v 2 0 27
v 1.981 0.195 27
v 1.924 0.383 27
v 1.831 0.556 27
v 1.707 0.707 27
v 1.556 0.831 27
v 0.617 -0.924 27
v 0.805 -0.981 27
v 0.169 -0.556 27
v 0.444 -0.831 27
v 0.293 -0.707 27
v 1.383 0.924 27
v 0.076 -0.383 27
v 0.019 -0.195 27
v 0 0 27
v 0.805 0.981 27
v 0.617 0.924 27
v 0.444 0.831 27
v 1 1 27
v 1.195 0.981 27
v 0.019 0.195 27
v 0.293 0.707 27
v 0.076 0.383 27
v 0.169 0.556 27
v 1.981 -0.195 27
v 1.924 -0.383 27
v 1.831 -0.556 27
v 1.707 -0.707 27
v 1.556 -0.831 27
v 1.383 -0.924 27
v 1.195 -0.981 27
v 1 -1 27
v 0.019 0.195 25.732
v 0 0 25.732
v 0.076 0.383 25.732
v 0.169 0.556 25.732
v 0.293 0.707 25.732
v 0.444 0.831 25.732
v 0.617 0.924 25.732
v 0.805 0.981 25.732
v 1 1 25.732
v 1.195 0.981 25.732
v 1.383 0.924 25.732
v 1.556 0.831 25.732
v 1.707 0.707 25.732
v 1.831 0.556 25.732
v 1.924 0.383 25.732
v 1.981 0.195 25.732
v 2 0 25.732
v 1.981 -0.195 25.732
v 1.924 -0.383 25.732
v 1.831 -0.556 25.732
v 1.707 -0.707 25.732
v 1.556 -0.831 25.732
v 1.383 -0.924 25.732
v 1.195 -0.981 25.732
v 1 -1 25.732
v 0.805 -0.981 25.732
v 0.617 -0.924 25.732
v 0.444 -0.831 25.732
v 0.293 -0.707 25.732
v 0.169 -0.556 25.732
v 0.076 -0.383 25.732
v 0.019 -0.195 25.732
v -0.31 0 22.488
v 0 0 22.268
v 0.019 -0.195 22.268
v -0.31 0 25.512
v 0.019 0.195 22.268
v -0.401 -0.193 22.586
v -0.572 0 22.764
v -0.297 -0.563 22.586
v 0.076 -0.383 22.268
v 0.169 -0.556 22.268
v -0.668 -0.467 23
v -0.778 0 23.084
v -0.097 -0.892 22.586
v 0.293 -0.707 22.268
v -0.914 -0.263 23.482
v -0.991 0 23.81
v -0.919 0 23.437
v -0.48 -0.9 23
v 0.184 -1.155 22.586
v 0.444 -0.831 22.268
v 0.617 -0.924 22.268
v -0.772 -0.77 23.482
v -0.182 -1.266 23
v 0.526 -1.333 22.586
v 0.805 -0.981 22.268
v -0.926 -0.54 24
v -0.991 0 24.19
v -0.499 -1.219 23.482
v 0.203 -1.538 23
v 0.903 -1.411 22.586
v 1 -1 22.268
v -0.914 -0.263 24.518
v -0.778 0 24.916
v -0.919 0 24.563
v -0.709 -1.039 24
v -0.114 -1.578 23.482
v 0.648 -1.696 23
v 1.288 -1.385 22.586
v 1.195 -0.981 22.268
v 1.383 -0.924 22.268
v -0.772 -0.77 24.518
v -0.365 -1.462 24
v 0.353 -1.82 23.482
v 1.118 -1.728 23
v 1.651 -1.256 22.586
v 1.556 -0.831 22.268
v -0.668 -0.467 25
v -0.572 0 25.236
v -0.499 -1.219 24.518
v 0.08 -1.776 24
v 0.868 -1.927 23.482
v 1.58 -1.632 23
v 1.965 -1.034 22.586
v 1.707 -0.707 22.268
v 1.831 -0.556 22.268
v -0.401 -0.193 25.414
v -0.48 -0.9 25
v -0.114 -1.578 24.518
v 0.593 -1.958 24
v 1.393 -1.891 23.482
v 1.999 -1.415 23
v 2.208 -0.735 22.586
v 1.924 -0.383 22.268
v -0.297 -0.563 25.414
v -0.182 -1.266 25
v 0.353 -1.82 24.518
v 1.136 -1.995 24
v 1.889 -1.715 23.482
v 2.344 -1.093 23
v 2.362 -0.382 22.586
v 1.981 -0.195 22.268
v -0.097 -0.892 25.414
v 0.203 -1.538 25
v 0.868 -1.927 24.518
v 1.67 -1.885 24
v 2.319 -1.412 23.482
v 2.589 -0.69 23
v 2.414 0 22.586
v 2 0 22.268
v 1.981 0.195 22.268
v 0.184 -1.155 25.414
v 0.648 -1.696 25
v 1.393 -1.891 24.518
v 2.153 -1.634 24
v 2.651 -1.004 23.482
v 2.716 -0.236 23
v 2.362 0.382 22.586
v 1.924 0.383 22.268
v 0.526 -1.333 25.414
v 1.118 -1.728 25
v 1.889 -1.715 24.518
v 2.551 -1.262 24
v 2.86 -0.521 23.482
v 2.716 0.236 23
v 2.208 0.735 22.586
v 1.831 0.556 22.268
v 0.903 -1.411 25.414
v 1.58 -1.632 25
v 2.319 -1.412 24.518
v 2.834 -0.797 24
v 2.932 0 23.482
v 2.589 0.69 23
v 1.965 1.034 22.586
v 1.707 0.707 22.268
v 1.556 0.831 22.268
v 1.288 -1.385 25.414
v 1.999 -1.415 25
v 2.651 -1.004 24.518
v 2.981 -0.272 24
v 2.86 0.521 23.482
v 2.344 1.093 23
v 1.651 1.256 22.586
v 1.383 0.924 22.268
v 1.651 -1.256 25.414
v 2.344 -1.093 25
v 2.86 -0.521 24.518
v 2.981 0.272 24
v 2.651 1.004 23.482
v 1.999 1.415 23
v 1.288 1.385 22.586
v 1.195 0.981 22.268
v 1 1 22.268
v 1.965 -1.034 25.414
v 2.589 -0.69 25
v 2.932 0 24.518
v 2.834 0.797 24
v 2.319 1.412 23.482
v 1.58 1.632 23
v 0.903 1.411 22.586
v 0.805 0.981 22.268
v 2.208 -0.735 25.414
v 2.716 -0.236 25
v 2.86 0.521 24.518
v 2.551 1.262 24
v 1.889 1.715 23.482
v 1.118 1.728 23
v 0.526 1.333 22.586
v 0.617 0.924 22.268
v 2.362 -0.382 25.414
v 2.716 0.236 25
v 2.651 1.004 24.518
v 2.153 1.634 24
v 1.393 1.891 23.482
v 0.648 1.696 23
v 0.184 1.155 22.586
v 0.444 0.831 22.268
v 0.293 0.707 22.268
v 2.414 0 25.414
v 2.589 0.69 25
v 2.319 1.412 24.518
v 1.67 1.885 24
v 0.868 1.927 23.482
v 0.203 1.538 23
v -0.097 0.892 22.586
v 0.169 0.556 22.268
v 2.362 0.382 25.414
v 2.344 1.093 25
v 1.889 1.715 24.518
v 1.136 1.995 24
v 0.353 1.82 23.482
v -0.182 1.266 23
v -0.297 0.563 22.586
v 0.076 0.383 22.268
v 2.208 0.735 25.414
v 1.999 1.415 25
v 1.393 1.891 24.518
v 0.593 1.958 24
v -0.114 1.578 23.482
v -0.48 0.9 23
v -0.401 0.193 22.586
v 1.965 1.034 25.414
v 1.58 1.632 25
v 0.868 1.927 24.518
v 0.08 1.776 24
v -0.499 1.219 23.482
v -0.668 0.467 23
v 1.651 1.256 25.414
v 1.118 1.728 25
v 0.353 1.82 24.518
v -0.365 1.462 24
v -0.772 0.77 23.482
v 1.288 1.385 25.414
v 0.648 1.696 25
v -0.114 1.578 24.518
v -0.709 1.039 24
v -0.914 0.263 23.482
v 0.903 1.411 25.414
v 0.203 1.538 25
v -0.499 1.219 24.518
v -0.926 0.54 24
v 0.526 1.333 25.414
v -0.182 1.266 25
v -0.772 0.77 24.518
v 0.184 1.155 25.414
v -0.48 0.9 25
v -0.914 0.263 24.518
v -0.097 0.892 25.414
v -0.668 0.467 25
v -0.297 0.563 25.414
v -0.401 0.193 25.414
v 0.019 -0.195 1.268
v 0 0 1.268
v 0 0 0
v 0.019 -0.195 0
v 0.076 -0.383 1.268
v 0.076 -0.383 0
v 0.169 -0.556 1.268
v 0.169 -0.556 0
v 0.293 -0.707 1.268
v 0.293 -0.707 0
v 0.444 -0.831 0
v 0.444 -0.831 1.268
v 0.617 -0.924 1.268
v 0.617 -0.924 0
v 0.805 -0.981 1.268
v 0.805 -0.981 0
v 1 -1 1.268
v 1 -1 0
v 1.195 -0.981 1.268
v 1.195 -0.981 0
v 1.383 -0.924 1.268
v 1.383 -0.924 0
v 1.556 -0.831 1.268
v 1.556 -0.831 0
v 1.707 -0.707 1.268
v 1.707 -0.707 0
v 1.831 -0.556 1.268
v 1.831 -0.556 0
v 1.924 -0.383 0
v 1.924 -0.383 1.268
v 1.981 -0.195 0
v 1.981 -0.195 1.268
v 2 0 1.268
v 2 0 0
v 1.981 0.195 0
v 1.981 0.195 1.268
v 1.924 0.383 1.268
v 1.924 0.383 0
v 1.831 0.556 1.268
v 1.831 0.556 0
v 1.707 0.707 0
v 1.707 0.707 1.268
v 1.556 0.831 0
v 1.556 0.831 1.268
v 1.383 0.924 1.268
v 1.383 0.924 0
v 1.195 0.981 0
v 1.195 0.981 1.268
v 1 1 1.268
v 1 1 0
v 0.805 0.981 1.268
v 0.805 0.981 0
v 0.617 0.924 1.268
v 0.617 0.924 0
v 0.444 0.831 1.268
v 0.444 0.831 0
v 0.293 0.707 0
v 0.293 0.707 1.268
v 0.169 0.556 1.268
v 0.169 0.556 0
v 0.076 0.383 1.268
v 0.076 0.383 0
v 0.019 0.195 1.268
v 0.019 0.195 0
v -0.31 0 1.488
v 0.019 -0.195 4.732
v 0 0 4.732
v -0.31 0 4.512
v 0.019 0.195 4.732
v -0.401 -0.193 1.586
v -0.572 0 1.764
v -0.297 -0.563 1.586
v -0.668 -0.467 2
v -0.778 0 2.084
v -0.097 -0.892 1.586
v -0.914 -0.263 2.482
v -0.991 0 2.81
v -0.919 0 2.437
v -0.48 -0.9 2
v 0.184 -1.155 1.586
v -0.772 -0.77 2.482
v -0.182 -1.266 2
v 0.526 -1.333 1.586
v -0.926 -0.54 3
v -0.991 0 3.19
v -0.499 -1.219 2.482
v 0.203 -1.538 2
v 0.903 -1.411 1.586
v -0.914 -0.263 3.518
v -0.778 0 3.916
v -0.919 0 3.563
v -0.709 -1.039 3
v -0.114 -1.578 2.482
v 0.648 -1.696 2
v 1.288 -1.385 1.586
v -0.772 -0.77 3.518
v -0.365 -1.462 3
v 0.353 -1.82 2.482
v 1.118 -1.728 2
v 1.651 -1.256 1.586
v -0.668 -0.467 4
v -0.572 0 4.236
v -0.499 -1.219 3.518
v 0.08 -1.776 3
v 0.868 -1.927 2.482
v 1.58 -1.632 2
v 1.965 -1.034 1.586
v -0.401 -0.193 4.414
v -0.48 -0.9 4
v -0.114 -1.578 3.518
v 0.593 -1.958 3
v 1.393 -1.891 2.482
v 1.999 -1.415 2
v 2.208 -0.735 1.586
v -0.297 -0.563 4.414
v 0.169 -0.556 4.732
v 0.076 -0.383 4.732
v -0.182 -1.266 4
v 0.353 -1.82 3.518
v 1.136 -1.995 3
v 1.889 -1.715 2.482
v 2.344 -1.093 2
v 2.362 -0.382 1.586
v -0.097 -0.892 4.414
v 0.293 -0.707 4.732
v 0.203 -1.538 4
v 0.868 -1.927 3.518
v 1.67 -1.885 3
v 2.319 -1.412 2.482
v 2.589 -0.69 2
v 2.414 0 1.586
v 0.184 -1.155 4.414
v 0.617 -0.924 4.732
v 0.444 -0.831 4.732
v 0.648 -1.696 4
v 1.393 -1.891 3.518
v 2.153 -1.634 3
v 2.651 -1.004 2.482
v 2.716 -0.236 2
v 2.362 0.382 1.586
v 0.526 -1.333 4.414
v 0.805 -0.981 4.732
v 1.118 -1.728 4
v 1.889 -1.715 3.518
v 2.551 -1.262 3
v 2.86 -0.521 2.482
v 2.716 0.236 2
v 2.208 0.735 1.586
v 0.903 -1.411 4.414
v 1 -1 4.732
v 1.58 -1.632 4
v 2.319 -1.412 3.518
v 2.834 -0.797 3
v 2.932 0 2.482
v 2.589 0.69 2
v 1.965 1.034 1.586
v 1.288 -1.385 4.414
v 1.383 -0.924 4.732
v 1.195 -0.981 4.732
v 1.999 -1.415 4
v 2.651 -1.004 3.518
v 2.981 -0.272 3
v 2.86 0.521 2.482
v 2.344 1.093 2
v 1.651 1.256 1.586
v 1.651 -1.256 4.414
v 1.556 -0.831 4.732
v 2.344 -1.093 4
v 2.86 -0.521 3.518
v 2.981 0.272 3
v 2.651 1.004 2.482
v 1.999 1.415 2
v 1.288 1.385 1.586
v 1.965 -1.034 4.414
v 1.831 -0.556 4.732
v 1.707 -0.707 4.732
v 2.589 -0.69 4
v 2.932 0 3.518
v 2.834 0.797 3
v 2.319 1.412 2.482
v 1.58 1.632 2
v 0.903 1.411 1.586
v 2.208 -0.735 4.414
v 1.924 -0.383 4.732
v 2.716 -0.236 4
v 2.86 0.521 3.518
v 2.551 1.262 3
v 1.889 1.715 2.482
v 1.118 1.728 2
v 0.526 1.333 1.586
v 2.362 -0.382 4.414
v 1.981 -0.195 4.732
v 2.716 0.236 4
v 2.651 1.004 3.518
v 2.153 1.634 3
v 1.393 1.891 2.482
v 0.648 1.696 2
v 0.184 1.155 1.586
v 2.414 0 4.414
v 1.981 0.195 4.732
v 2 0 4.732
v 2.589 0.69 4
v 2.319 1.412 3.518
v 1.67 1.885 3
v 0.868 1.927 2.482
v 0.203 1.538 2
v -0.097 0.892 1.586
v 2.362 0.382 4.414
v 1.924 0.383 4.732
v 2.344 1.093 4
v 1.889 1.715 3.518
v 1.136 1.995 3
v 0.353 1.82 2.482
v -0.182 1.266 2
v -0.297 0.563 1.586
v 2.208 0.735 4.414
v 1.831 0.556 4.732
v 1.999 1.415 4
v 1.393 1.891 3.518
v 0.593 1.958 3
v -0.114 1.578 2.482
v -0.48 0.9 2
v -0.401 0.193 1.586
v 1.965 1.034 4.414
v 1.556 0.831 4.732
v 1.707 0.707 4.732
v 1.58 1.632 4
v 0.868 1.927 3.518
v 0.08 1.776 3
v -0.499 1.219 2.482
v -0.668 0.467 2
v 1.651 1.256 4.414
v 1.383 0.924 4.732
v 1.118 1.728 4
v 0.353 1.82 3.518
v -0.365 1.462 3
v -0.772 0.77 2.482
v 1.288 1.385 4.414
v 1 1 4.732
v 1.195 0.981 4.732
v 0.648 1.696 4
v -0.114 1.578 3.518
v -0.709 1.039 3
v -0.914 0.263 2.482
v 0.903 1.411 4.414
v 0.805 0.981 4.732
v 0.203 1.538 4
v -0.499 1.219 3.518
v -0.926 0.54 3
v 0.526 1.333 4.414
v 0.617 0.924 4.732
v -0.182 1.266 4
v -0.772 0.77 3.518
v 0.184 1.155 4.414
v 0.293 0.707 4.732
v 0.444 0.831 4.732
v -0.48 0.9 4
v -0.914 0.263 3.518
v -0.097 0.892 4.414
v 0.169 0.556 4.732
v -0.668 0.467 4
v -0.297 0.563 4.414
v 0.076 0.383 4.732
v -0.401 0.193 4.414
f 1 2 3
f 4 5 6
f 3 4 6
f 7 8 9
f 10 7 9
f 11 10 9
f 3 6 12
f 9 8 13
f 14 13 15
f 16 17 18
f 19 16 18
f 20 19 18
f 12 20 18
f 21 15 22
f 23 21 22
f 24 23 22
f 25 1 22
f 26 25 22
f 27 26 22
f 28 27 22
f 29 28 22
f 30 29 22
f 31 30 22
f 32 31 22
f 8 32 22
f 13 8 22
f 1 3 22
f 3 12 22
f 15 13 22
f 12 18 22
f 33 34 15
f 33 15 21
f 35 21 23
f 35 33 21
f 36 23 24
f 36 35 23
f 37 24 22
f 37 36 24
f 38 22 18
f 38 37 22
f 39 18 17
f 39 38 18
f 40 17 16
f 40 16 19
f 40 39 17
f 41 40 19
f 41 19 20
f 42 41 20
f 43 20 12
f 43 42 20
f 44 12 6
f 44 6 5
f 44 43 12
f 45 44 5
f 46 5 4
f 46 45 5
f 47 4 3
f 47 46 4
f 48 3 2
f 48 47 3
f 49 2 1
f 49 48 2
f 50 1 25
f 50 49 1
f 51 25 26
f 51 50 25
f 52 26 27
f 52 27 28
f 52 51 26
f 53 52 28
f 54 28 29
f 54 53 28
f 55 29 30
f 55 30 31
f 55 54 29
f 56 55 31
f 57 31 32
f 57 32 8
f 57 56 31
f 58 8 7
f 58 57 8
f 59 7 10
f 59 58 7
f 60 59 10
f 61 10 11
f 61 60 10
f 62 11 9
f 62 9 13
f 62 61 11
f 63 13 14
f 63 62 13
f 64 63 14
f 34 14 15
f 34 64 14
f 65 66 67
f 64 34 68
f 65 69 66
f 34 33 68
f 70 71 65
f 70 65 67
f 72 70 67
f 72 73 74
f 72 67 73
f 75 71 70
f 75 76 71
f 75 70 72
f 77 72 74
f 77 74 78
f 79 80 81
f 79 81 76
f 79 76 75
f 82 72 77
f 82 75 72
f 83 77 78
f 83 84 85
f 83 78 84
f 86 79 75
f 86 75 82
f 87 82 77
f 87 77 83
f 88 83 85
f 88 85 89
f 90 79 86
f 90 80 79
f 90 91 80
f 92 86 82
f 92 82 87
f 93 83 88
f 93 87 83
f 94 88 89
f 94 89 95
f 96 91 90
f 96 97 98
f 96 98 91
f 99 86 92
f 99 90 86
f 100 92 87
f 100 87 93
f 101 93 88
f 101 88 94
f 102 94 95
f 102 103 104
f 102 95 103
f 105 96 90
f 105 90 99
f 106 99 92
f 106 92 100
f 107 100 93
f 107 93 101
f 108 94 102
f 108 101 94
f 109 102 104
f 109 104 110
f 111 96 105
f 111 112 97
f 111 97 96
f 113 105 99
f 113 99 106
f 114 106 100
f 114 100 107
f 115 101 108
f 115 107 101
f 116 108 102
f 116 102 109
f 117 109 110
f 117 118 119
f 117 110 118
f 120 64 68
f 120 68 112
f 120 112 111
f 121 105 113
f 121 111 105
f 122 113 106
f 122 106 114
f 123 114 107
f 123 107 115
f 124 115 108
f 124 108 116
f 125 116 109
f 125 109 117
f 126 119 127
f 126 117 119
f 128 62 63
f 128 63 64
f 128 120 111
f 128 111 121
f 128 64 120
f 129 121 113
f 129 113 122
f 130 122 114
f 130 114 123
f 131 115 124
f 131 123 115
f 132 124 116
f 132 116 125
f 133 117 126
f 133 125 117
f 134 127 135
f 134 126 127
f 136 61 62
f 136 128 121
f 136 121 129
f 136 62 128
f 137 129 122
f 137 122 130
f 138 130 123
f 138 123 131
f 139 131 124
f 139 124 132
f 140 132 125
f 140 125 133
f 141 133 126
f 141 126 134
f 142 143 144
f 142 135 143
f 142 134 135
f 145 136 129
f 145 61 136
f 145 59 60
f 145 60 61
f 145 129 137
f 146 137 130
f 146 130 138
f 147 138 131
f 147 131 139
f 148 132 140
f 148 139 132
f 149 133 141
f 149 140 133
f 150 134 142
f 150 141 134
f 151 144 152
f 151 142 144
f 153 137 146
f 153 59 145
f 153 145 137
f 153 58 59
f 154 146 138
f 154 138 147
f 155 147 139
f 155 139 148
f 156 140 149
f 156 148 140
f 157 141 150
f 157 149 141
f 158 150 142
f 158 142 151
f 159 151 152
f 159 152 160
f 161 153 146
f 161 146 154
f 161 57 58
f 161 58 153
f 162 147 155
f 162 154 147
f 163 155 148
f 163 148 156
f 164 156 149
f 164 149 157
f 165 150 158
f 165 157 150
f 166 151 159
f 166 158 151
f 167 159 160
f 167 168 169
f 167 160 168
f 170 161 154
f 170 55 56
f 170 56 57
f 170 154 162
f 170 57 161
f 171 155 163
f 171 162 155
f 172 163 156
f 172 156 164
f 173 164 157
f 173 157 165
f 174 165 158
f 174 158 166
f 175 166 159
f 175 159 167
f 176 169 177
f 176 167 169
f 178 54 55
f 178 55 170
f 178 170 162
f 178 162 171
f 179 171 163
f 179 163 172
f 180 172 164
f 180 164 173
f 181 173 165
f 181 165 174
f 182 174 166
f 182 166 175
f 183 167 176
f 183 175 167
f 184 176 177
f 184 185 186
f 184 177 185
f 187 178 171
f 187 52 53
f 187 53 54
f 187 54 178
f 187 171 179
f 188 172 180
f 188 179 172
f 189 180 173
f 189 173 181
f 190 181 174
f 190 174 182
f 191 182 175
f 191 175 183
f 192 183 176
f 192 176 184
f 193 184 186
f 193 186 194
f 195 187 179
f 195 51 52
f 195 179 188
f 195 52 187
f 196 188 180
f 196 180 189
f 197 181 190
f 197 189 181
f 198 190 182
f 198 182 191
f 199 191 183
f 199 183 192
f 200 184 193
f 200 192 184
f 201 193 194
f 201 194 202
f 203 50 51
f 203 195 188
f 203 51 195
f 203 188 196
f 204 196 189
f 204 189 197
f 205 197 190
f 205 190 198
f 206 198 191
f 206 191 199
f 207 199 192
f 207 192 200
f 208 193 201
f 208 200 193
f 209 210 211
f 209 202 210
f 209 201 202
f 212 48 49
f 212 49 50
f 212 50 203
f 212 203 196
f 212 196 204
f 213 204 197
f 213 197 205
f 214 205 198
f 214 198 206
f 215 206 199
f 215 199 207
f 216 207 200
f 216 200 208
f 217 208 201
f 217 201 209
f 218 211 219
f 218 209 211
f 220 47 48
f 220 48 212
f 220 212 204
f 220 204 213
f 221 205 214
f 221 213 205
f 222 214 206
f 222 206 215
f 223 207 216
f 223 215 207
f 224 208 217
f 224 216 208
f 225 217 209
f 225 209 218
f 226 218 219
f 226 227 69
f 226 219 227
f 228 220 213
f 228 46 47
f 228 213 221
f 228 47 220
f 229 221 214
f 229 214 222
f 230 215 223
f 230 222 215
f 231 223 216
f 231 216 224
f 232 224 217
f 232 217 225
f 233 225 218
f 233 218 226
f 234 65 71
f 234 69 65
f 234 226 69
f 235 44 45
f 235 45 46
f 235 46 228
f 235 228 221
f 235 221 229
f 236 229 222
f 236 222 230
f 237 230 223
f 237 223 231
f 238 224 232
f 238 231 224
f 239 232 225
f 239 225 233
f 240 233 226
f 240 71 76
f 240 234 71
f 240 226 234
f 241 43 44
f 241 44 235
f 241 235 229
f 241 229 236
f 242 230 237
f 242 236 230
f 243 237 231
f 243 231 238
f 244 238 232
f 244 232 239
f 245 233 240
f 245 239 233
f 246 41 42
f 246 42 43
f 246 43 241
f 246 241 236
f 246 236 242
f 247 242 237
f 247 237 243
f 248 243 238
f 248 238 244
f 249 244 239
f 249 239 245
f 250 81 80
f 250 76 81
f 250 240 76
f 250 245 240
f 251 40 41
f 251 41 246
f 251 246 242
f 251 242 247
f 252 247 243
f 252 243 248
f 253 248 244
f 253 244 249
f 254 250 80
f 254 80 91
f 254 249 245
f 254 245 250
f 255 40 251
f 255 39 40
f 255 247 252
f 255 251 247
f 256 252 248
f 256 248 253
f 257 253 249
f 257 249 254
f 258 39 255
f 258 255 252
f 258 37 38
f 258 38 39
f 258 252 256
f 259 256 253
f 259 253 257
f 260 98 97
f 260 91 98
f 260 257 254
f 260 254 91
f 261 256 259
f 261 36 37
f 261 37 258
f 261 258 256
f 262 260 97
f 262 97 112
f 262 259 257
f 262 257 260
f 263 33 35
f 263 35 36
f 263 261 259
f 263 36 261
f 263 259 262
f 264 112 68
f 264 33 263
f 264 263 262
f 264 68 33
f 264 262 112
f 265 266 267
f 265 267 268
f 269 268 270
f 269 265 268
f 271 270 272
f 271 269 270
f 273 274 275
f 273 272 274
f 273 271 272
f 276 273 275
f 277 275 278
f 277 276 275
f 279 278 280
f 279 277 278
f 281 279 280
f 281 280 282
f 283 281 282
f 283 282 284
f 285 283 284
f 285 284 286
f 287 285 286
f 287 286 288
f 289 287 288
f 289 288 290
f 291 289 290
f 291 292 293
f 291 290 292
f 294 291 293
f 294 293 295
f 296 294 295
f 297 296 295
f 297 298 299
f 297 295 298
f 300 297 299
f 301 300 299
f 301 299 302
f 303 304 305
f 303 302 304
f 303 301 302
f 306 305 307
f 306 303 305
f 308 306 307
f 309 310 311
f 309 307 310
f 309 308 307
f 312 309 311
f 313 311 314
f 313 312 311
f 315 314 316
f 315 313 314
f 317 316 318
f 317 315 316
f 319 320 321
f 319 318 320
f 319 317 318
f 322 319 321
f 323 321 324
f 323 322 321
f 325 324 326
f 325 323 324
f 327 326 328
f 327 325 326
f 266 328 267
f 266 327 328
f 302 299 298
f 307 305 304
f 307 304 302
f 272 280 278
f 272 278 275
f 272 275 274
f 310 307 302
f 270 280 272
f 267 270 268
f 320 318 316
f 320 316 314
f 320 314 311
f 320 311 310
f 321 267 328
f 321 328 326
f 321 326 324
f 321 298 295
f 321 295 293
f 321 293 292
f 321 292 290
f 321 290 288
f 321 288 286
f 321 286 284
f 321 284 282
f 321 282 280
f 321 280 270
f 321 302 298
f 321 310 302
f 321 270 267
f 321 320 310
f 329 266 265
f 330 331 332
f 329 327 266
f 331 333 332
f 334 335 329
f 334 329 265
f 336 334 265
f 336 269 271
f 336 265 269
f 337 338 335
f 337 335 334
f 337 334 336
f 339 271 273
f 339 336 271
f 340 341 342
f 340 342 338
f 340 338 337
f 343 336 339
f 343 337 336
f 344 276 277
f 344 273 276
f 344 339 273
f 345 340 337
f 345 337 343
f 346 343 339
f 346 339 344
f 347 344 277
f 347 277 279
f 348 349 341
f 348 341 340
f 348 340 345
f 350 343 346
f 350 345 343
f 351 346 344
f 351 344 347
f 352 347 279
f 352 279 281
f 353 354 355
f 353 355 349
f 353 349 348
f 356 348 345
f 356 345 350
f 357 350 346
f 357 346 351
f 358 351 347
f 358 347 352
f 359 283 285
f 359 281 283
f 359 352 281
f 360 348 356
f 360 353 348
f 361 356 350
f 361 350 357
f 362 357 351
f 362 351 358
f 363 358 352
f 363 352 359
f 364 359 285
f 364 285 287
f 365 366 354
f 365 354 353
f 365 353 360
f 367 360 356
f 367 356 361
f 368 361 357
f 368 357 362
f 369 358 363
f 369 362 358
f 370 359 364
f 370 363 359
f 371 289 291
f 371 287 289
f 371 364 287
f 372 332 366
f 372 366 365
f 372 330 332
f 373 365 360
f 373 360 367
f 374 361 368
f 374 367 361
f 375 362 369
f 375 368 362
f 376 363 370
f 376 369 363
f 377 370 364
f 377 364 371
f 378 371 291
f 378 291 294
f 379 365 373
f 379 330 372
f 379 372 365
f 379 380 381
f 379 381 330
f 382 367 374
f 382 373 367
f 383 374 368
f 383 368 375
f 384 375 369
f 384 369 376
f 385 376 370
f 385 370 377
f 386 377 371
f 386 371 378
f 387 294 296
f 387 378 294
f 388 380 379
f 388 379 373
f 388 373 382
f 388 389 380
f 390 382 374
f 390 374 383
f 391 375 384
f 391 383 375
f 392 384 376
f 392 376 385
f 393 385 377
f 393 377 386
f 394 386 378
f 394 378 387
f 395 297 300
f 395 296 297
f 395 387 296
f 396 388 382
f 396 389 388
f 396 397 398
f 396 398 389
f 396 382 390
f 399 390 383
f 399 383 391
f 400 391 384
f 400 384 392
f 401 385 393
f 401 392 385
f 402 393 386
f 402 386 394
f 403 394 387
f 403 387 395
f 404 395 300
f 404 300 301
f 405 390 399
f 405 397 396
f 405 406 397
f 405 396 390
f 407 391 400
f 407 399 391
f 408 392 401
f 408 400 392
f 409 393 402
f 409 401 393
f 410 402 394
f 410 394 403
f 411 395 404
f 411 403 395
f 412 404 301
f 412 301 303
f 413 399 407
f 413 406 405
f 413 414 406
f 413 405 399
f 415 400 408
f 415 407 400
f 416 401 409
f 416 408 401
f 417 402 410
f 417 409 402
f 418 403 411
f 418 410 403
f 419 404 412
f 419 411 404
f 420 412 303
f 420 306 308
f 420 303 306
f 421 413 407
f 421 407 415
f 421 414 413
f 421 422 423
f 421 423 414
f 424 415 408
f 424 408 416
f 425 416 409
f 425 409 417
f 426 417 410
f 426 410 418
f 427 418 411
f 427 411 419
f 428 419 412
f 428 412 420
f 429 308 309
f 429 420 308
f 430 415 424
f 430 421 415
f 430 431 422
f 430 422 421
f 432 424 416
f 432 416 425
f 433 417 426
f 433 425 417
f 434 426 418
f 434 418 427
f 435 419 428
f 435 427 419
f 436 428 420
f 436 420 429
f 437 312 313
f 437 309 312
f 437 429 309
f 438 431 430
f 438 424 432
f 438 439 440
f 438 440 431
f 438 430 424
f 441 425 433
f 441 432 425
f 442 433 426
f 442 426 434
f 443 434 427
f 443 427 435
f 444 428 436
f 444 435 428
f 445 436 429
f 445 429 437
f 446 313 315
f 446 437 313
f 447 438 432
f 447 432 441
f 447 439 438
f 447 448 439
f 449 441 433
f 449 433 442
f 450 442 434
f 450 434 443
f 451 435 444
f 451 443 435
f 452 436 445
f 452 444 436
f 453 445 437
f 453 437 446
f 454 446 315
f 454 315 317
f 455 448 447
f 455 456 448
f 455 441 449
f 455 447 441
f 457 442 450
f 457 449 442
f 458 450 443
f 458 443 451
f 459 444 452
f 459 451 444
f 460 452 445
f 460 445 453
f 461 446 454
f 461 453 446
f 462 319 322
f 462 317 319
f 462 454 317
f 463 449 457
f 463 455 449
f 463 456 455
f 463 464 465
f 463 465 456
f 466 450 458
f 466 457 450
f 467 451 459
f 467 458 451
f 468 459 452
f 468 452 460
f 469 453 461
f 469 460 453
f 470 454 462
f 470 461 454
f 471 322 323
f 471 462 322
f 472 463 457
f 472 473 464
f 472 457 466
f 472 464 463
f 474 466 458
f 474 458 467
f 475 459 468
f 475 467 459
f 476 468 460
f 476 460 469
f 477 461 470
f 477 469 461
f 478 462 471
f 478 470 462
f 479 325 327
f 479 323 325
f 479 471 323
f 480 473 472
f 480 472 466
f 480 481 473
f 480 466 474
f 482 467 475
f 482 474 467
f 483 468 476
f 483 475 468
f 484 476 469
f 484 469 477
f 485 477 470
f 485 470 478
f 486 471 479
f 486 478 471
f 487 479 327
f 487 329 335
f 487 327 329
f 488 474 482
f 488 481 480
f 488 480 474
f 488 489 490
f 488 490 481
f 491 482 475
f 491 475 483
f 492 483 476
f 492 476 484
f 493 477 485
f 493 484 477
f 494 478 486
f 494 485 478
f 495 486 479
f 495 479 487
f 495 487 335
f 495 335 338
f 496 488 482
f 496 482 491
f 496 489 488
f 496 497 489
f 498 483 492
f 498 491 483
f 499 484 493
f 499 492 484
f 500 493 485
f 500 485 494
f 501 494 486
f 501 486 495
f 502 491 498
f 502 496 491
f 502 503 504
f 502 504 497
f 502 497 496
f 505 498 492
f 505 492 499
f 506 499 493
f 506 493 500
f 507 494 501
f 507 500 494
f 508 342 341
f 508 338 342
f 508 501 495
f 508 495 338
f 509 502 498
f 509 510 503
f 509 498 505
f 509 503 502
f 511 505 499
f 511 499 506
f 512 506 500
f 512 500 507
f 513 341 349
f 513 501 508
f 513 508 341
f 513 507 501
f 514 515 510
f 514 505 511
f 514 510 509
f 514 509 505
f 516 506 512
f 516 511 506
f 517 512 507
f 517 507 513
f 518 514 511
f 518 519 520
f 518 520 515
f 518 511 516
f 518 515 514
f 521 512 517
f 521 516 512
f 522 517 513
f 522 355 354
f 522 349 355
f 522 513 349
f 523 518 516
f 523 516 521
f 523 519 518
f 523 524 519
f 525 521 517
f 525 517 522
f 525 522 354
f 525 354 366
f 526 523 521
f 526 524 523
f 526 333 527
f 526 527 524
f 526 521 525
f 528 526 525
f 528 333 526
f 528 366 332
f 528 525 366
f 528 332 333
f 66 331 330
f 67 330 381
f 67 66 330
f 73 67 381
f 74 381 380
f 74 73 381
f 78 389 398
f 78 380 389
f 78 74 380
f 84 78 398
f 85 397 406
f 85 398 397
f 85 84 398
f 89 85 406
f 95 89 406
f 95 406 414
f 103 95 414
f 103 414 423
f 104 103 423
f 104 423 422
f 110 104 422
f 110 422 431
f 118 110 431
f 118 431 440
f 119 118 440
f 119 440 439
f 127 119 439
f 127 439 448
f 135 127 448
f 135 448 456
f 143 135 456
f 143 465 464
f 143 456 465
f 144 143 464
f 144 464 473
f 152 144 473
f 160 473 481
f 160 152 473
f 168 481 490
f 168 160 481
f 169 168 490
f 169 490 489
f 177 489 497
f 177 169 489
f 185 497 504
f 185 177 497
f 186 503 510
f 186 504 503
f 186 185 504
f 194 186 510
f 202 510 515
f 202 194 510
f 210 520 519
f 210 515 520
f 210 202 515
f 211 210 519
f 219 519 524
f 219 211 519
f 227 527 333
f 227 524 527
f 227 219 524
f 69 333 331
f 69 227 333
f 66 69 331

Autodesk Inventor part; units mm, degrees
ref_plane "YZ Plane" through (0, 0, 0) normal (1, 0, 0) x (0, 1, 0)
ref_plane "XZ Plane" through (0, 0, 0) normal (0, 1, 0) x (-1, 0, 0)
ref_plane "XY Plane" through (0, 0, 0) normal (0, 0, 1) x (1, 0, 0)
sketch "Sketch1" plane through (0, 0, 0) normal (0, 1, 0) x (-1, 0, 0)
  line L0 (0, 0) -> (0, 27) construction
  line L1 (0, 0) -> (0, 1.2679)
  line L2 (0, 4.7321) -> (0, 22.2679)
  line L3 (0, 27) -> (0, 25.7321)
  line L4 (-1, 30.1625) -> (-1, -2.7373)
  line L5 (0, 27) -> (-1, 27)
  line L6 (0, 0) -> (-1, 0)
  line L7 (0, 26) -> (0, 22) construction
  line L8 (0, 24) -> (-1, 24) construction
  circle A0 centre (-1, 24) radius 2
  line L9 (0, 5) -> (0, 1) construction
  line L10 (0, 3) -> (-1, 3) construction
  circle A1 centre (-1, 3) radius 2
  dimension "d0" = 27
  dimension "d8" = 1
  dimension "d9" = 4
  dimension "d10" = 4
revolve "Revolution1" add sketch "Sketch1" angle 360 about axis through (1, 0, 30.1625) along (0, 0, -1) picked at (-0.5539, 3.4954) picked at (-0.772, 24.6265) contours L6 L4 A1 L1 | A1 L4 | A1 L4 A0 L2 | A0 L4 | L4 L5 L3 A0
properties part number "Delts Robot Arm Joint Rod"
